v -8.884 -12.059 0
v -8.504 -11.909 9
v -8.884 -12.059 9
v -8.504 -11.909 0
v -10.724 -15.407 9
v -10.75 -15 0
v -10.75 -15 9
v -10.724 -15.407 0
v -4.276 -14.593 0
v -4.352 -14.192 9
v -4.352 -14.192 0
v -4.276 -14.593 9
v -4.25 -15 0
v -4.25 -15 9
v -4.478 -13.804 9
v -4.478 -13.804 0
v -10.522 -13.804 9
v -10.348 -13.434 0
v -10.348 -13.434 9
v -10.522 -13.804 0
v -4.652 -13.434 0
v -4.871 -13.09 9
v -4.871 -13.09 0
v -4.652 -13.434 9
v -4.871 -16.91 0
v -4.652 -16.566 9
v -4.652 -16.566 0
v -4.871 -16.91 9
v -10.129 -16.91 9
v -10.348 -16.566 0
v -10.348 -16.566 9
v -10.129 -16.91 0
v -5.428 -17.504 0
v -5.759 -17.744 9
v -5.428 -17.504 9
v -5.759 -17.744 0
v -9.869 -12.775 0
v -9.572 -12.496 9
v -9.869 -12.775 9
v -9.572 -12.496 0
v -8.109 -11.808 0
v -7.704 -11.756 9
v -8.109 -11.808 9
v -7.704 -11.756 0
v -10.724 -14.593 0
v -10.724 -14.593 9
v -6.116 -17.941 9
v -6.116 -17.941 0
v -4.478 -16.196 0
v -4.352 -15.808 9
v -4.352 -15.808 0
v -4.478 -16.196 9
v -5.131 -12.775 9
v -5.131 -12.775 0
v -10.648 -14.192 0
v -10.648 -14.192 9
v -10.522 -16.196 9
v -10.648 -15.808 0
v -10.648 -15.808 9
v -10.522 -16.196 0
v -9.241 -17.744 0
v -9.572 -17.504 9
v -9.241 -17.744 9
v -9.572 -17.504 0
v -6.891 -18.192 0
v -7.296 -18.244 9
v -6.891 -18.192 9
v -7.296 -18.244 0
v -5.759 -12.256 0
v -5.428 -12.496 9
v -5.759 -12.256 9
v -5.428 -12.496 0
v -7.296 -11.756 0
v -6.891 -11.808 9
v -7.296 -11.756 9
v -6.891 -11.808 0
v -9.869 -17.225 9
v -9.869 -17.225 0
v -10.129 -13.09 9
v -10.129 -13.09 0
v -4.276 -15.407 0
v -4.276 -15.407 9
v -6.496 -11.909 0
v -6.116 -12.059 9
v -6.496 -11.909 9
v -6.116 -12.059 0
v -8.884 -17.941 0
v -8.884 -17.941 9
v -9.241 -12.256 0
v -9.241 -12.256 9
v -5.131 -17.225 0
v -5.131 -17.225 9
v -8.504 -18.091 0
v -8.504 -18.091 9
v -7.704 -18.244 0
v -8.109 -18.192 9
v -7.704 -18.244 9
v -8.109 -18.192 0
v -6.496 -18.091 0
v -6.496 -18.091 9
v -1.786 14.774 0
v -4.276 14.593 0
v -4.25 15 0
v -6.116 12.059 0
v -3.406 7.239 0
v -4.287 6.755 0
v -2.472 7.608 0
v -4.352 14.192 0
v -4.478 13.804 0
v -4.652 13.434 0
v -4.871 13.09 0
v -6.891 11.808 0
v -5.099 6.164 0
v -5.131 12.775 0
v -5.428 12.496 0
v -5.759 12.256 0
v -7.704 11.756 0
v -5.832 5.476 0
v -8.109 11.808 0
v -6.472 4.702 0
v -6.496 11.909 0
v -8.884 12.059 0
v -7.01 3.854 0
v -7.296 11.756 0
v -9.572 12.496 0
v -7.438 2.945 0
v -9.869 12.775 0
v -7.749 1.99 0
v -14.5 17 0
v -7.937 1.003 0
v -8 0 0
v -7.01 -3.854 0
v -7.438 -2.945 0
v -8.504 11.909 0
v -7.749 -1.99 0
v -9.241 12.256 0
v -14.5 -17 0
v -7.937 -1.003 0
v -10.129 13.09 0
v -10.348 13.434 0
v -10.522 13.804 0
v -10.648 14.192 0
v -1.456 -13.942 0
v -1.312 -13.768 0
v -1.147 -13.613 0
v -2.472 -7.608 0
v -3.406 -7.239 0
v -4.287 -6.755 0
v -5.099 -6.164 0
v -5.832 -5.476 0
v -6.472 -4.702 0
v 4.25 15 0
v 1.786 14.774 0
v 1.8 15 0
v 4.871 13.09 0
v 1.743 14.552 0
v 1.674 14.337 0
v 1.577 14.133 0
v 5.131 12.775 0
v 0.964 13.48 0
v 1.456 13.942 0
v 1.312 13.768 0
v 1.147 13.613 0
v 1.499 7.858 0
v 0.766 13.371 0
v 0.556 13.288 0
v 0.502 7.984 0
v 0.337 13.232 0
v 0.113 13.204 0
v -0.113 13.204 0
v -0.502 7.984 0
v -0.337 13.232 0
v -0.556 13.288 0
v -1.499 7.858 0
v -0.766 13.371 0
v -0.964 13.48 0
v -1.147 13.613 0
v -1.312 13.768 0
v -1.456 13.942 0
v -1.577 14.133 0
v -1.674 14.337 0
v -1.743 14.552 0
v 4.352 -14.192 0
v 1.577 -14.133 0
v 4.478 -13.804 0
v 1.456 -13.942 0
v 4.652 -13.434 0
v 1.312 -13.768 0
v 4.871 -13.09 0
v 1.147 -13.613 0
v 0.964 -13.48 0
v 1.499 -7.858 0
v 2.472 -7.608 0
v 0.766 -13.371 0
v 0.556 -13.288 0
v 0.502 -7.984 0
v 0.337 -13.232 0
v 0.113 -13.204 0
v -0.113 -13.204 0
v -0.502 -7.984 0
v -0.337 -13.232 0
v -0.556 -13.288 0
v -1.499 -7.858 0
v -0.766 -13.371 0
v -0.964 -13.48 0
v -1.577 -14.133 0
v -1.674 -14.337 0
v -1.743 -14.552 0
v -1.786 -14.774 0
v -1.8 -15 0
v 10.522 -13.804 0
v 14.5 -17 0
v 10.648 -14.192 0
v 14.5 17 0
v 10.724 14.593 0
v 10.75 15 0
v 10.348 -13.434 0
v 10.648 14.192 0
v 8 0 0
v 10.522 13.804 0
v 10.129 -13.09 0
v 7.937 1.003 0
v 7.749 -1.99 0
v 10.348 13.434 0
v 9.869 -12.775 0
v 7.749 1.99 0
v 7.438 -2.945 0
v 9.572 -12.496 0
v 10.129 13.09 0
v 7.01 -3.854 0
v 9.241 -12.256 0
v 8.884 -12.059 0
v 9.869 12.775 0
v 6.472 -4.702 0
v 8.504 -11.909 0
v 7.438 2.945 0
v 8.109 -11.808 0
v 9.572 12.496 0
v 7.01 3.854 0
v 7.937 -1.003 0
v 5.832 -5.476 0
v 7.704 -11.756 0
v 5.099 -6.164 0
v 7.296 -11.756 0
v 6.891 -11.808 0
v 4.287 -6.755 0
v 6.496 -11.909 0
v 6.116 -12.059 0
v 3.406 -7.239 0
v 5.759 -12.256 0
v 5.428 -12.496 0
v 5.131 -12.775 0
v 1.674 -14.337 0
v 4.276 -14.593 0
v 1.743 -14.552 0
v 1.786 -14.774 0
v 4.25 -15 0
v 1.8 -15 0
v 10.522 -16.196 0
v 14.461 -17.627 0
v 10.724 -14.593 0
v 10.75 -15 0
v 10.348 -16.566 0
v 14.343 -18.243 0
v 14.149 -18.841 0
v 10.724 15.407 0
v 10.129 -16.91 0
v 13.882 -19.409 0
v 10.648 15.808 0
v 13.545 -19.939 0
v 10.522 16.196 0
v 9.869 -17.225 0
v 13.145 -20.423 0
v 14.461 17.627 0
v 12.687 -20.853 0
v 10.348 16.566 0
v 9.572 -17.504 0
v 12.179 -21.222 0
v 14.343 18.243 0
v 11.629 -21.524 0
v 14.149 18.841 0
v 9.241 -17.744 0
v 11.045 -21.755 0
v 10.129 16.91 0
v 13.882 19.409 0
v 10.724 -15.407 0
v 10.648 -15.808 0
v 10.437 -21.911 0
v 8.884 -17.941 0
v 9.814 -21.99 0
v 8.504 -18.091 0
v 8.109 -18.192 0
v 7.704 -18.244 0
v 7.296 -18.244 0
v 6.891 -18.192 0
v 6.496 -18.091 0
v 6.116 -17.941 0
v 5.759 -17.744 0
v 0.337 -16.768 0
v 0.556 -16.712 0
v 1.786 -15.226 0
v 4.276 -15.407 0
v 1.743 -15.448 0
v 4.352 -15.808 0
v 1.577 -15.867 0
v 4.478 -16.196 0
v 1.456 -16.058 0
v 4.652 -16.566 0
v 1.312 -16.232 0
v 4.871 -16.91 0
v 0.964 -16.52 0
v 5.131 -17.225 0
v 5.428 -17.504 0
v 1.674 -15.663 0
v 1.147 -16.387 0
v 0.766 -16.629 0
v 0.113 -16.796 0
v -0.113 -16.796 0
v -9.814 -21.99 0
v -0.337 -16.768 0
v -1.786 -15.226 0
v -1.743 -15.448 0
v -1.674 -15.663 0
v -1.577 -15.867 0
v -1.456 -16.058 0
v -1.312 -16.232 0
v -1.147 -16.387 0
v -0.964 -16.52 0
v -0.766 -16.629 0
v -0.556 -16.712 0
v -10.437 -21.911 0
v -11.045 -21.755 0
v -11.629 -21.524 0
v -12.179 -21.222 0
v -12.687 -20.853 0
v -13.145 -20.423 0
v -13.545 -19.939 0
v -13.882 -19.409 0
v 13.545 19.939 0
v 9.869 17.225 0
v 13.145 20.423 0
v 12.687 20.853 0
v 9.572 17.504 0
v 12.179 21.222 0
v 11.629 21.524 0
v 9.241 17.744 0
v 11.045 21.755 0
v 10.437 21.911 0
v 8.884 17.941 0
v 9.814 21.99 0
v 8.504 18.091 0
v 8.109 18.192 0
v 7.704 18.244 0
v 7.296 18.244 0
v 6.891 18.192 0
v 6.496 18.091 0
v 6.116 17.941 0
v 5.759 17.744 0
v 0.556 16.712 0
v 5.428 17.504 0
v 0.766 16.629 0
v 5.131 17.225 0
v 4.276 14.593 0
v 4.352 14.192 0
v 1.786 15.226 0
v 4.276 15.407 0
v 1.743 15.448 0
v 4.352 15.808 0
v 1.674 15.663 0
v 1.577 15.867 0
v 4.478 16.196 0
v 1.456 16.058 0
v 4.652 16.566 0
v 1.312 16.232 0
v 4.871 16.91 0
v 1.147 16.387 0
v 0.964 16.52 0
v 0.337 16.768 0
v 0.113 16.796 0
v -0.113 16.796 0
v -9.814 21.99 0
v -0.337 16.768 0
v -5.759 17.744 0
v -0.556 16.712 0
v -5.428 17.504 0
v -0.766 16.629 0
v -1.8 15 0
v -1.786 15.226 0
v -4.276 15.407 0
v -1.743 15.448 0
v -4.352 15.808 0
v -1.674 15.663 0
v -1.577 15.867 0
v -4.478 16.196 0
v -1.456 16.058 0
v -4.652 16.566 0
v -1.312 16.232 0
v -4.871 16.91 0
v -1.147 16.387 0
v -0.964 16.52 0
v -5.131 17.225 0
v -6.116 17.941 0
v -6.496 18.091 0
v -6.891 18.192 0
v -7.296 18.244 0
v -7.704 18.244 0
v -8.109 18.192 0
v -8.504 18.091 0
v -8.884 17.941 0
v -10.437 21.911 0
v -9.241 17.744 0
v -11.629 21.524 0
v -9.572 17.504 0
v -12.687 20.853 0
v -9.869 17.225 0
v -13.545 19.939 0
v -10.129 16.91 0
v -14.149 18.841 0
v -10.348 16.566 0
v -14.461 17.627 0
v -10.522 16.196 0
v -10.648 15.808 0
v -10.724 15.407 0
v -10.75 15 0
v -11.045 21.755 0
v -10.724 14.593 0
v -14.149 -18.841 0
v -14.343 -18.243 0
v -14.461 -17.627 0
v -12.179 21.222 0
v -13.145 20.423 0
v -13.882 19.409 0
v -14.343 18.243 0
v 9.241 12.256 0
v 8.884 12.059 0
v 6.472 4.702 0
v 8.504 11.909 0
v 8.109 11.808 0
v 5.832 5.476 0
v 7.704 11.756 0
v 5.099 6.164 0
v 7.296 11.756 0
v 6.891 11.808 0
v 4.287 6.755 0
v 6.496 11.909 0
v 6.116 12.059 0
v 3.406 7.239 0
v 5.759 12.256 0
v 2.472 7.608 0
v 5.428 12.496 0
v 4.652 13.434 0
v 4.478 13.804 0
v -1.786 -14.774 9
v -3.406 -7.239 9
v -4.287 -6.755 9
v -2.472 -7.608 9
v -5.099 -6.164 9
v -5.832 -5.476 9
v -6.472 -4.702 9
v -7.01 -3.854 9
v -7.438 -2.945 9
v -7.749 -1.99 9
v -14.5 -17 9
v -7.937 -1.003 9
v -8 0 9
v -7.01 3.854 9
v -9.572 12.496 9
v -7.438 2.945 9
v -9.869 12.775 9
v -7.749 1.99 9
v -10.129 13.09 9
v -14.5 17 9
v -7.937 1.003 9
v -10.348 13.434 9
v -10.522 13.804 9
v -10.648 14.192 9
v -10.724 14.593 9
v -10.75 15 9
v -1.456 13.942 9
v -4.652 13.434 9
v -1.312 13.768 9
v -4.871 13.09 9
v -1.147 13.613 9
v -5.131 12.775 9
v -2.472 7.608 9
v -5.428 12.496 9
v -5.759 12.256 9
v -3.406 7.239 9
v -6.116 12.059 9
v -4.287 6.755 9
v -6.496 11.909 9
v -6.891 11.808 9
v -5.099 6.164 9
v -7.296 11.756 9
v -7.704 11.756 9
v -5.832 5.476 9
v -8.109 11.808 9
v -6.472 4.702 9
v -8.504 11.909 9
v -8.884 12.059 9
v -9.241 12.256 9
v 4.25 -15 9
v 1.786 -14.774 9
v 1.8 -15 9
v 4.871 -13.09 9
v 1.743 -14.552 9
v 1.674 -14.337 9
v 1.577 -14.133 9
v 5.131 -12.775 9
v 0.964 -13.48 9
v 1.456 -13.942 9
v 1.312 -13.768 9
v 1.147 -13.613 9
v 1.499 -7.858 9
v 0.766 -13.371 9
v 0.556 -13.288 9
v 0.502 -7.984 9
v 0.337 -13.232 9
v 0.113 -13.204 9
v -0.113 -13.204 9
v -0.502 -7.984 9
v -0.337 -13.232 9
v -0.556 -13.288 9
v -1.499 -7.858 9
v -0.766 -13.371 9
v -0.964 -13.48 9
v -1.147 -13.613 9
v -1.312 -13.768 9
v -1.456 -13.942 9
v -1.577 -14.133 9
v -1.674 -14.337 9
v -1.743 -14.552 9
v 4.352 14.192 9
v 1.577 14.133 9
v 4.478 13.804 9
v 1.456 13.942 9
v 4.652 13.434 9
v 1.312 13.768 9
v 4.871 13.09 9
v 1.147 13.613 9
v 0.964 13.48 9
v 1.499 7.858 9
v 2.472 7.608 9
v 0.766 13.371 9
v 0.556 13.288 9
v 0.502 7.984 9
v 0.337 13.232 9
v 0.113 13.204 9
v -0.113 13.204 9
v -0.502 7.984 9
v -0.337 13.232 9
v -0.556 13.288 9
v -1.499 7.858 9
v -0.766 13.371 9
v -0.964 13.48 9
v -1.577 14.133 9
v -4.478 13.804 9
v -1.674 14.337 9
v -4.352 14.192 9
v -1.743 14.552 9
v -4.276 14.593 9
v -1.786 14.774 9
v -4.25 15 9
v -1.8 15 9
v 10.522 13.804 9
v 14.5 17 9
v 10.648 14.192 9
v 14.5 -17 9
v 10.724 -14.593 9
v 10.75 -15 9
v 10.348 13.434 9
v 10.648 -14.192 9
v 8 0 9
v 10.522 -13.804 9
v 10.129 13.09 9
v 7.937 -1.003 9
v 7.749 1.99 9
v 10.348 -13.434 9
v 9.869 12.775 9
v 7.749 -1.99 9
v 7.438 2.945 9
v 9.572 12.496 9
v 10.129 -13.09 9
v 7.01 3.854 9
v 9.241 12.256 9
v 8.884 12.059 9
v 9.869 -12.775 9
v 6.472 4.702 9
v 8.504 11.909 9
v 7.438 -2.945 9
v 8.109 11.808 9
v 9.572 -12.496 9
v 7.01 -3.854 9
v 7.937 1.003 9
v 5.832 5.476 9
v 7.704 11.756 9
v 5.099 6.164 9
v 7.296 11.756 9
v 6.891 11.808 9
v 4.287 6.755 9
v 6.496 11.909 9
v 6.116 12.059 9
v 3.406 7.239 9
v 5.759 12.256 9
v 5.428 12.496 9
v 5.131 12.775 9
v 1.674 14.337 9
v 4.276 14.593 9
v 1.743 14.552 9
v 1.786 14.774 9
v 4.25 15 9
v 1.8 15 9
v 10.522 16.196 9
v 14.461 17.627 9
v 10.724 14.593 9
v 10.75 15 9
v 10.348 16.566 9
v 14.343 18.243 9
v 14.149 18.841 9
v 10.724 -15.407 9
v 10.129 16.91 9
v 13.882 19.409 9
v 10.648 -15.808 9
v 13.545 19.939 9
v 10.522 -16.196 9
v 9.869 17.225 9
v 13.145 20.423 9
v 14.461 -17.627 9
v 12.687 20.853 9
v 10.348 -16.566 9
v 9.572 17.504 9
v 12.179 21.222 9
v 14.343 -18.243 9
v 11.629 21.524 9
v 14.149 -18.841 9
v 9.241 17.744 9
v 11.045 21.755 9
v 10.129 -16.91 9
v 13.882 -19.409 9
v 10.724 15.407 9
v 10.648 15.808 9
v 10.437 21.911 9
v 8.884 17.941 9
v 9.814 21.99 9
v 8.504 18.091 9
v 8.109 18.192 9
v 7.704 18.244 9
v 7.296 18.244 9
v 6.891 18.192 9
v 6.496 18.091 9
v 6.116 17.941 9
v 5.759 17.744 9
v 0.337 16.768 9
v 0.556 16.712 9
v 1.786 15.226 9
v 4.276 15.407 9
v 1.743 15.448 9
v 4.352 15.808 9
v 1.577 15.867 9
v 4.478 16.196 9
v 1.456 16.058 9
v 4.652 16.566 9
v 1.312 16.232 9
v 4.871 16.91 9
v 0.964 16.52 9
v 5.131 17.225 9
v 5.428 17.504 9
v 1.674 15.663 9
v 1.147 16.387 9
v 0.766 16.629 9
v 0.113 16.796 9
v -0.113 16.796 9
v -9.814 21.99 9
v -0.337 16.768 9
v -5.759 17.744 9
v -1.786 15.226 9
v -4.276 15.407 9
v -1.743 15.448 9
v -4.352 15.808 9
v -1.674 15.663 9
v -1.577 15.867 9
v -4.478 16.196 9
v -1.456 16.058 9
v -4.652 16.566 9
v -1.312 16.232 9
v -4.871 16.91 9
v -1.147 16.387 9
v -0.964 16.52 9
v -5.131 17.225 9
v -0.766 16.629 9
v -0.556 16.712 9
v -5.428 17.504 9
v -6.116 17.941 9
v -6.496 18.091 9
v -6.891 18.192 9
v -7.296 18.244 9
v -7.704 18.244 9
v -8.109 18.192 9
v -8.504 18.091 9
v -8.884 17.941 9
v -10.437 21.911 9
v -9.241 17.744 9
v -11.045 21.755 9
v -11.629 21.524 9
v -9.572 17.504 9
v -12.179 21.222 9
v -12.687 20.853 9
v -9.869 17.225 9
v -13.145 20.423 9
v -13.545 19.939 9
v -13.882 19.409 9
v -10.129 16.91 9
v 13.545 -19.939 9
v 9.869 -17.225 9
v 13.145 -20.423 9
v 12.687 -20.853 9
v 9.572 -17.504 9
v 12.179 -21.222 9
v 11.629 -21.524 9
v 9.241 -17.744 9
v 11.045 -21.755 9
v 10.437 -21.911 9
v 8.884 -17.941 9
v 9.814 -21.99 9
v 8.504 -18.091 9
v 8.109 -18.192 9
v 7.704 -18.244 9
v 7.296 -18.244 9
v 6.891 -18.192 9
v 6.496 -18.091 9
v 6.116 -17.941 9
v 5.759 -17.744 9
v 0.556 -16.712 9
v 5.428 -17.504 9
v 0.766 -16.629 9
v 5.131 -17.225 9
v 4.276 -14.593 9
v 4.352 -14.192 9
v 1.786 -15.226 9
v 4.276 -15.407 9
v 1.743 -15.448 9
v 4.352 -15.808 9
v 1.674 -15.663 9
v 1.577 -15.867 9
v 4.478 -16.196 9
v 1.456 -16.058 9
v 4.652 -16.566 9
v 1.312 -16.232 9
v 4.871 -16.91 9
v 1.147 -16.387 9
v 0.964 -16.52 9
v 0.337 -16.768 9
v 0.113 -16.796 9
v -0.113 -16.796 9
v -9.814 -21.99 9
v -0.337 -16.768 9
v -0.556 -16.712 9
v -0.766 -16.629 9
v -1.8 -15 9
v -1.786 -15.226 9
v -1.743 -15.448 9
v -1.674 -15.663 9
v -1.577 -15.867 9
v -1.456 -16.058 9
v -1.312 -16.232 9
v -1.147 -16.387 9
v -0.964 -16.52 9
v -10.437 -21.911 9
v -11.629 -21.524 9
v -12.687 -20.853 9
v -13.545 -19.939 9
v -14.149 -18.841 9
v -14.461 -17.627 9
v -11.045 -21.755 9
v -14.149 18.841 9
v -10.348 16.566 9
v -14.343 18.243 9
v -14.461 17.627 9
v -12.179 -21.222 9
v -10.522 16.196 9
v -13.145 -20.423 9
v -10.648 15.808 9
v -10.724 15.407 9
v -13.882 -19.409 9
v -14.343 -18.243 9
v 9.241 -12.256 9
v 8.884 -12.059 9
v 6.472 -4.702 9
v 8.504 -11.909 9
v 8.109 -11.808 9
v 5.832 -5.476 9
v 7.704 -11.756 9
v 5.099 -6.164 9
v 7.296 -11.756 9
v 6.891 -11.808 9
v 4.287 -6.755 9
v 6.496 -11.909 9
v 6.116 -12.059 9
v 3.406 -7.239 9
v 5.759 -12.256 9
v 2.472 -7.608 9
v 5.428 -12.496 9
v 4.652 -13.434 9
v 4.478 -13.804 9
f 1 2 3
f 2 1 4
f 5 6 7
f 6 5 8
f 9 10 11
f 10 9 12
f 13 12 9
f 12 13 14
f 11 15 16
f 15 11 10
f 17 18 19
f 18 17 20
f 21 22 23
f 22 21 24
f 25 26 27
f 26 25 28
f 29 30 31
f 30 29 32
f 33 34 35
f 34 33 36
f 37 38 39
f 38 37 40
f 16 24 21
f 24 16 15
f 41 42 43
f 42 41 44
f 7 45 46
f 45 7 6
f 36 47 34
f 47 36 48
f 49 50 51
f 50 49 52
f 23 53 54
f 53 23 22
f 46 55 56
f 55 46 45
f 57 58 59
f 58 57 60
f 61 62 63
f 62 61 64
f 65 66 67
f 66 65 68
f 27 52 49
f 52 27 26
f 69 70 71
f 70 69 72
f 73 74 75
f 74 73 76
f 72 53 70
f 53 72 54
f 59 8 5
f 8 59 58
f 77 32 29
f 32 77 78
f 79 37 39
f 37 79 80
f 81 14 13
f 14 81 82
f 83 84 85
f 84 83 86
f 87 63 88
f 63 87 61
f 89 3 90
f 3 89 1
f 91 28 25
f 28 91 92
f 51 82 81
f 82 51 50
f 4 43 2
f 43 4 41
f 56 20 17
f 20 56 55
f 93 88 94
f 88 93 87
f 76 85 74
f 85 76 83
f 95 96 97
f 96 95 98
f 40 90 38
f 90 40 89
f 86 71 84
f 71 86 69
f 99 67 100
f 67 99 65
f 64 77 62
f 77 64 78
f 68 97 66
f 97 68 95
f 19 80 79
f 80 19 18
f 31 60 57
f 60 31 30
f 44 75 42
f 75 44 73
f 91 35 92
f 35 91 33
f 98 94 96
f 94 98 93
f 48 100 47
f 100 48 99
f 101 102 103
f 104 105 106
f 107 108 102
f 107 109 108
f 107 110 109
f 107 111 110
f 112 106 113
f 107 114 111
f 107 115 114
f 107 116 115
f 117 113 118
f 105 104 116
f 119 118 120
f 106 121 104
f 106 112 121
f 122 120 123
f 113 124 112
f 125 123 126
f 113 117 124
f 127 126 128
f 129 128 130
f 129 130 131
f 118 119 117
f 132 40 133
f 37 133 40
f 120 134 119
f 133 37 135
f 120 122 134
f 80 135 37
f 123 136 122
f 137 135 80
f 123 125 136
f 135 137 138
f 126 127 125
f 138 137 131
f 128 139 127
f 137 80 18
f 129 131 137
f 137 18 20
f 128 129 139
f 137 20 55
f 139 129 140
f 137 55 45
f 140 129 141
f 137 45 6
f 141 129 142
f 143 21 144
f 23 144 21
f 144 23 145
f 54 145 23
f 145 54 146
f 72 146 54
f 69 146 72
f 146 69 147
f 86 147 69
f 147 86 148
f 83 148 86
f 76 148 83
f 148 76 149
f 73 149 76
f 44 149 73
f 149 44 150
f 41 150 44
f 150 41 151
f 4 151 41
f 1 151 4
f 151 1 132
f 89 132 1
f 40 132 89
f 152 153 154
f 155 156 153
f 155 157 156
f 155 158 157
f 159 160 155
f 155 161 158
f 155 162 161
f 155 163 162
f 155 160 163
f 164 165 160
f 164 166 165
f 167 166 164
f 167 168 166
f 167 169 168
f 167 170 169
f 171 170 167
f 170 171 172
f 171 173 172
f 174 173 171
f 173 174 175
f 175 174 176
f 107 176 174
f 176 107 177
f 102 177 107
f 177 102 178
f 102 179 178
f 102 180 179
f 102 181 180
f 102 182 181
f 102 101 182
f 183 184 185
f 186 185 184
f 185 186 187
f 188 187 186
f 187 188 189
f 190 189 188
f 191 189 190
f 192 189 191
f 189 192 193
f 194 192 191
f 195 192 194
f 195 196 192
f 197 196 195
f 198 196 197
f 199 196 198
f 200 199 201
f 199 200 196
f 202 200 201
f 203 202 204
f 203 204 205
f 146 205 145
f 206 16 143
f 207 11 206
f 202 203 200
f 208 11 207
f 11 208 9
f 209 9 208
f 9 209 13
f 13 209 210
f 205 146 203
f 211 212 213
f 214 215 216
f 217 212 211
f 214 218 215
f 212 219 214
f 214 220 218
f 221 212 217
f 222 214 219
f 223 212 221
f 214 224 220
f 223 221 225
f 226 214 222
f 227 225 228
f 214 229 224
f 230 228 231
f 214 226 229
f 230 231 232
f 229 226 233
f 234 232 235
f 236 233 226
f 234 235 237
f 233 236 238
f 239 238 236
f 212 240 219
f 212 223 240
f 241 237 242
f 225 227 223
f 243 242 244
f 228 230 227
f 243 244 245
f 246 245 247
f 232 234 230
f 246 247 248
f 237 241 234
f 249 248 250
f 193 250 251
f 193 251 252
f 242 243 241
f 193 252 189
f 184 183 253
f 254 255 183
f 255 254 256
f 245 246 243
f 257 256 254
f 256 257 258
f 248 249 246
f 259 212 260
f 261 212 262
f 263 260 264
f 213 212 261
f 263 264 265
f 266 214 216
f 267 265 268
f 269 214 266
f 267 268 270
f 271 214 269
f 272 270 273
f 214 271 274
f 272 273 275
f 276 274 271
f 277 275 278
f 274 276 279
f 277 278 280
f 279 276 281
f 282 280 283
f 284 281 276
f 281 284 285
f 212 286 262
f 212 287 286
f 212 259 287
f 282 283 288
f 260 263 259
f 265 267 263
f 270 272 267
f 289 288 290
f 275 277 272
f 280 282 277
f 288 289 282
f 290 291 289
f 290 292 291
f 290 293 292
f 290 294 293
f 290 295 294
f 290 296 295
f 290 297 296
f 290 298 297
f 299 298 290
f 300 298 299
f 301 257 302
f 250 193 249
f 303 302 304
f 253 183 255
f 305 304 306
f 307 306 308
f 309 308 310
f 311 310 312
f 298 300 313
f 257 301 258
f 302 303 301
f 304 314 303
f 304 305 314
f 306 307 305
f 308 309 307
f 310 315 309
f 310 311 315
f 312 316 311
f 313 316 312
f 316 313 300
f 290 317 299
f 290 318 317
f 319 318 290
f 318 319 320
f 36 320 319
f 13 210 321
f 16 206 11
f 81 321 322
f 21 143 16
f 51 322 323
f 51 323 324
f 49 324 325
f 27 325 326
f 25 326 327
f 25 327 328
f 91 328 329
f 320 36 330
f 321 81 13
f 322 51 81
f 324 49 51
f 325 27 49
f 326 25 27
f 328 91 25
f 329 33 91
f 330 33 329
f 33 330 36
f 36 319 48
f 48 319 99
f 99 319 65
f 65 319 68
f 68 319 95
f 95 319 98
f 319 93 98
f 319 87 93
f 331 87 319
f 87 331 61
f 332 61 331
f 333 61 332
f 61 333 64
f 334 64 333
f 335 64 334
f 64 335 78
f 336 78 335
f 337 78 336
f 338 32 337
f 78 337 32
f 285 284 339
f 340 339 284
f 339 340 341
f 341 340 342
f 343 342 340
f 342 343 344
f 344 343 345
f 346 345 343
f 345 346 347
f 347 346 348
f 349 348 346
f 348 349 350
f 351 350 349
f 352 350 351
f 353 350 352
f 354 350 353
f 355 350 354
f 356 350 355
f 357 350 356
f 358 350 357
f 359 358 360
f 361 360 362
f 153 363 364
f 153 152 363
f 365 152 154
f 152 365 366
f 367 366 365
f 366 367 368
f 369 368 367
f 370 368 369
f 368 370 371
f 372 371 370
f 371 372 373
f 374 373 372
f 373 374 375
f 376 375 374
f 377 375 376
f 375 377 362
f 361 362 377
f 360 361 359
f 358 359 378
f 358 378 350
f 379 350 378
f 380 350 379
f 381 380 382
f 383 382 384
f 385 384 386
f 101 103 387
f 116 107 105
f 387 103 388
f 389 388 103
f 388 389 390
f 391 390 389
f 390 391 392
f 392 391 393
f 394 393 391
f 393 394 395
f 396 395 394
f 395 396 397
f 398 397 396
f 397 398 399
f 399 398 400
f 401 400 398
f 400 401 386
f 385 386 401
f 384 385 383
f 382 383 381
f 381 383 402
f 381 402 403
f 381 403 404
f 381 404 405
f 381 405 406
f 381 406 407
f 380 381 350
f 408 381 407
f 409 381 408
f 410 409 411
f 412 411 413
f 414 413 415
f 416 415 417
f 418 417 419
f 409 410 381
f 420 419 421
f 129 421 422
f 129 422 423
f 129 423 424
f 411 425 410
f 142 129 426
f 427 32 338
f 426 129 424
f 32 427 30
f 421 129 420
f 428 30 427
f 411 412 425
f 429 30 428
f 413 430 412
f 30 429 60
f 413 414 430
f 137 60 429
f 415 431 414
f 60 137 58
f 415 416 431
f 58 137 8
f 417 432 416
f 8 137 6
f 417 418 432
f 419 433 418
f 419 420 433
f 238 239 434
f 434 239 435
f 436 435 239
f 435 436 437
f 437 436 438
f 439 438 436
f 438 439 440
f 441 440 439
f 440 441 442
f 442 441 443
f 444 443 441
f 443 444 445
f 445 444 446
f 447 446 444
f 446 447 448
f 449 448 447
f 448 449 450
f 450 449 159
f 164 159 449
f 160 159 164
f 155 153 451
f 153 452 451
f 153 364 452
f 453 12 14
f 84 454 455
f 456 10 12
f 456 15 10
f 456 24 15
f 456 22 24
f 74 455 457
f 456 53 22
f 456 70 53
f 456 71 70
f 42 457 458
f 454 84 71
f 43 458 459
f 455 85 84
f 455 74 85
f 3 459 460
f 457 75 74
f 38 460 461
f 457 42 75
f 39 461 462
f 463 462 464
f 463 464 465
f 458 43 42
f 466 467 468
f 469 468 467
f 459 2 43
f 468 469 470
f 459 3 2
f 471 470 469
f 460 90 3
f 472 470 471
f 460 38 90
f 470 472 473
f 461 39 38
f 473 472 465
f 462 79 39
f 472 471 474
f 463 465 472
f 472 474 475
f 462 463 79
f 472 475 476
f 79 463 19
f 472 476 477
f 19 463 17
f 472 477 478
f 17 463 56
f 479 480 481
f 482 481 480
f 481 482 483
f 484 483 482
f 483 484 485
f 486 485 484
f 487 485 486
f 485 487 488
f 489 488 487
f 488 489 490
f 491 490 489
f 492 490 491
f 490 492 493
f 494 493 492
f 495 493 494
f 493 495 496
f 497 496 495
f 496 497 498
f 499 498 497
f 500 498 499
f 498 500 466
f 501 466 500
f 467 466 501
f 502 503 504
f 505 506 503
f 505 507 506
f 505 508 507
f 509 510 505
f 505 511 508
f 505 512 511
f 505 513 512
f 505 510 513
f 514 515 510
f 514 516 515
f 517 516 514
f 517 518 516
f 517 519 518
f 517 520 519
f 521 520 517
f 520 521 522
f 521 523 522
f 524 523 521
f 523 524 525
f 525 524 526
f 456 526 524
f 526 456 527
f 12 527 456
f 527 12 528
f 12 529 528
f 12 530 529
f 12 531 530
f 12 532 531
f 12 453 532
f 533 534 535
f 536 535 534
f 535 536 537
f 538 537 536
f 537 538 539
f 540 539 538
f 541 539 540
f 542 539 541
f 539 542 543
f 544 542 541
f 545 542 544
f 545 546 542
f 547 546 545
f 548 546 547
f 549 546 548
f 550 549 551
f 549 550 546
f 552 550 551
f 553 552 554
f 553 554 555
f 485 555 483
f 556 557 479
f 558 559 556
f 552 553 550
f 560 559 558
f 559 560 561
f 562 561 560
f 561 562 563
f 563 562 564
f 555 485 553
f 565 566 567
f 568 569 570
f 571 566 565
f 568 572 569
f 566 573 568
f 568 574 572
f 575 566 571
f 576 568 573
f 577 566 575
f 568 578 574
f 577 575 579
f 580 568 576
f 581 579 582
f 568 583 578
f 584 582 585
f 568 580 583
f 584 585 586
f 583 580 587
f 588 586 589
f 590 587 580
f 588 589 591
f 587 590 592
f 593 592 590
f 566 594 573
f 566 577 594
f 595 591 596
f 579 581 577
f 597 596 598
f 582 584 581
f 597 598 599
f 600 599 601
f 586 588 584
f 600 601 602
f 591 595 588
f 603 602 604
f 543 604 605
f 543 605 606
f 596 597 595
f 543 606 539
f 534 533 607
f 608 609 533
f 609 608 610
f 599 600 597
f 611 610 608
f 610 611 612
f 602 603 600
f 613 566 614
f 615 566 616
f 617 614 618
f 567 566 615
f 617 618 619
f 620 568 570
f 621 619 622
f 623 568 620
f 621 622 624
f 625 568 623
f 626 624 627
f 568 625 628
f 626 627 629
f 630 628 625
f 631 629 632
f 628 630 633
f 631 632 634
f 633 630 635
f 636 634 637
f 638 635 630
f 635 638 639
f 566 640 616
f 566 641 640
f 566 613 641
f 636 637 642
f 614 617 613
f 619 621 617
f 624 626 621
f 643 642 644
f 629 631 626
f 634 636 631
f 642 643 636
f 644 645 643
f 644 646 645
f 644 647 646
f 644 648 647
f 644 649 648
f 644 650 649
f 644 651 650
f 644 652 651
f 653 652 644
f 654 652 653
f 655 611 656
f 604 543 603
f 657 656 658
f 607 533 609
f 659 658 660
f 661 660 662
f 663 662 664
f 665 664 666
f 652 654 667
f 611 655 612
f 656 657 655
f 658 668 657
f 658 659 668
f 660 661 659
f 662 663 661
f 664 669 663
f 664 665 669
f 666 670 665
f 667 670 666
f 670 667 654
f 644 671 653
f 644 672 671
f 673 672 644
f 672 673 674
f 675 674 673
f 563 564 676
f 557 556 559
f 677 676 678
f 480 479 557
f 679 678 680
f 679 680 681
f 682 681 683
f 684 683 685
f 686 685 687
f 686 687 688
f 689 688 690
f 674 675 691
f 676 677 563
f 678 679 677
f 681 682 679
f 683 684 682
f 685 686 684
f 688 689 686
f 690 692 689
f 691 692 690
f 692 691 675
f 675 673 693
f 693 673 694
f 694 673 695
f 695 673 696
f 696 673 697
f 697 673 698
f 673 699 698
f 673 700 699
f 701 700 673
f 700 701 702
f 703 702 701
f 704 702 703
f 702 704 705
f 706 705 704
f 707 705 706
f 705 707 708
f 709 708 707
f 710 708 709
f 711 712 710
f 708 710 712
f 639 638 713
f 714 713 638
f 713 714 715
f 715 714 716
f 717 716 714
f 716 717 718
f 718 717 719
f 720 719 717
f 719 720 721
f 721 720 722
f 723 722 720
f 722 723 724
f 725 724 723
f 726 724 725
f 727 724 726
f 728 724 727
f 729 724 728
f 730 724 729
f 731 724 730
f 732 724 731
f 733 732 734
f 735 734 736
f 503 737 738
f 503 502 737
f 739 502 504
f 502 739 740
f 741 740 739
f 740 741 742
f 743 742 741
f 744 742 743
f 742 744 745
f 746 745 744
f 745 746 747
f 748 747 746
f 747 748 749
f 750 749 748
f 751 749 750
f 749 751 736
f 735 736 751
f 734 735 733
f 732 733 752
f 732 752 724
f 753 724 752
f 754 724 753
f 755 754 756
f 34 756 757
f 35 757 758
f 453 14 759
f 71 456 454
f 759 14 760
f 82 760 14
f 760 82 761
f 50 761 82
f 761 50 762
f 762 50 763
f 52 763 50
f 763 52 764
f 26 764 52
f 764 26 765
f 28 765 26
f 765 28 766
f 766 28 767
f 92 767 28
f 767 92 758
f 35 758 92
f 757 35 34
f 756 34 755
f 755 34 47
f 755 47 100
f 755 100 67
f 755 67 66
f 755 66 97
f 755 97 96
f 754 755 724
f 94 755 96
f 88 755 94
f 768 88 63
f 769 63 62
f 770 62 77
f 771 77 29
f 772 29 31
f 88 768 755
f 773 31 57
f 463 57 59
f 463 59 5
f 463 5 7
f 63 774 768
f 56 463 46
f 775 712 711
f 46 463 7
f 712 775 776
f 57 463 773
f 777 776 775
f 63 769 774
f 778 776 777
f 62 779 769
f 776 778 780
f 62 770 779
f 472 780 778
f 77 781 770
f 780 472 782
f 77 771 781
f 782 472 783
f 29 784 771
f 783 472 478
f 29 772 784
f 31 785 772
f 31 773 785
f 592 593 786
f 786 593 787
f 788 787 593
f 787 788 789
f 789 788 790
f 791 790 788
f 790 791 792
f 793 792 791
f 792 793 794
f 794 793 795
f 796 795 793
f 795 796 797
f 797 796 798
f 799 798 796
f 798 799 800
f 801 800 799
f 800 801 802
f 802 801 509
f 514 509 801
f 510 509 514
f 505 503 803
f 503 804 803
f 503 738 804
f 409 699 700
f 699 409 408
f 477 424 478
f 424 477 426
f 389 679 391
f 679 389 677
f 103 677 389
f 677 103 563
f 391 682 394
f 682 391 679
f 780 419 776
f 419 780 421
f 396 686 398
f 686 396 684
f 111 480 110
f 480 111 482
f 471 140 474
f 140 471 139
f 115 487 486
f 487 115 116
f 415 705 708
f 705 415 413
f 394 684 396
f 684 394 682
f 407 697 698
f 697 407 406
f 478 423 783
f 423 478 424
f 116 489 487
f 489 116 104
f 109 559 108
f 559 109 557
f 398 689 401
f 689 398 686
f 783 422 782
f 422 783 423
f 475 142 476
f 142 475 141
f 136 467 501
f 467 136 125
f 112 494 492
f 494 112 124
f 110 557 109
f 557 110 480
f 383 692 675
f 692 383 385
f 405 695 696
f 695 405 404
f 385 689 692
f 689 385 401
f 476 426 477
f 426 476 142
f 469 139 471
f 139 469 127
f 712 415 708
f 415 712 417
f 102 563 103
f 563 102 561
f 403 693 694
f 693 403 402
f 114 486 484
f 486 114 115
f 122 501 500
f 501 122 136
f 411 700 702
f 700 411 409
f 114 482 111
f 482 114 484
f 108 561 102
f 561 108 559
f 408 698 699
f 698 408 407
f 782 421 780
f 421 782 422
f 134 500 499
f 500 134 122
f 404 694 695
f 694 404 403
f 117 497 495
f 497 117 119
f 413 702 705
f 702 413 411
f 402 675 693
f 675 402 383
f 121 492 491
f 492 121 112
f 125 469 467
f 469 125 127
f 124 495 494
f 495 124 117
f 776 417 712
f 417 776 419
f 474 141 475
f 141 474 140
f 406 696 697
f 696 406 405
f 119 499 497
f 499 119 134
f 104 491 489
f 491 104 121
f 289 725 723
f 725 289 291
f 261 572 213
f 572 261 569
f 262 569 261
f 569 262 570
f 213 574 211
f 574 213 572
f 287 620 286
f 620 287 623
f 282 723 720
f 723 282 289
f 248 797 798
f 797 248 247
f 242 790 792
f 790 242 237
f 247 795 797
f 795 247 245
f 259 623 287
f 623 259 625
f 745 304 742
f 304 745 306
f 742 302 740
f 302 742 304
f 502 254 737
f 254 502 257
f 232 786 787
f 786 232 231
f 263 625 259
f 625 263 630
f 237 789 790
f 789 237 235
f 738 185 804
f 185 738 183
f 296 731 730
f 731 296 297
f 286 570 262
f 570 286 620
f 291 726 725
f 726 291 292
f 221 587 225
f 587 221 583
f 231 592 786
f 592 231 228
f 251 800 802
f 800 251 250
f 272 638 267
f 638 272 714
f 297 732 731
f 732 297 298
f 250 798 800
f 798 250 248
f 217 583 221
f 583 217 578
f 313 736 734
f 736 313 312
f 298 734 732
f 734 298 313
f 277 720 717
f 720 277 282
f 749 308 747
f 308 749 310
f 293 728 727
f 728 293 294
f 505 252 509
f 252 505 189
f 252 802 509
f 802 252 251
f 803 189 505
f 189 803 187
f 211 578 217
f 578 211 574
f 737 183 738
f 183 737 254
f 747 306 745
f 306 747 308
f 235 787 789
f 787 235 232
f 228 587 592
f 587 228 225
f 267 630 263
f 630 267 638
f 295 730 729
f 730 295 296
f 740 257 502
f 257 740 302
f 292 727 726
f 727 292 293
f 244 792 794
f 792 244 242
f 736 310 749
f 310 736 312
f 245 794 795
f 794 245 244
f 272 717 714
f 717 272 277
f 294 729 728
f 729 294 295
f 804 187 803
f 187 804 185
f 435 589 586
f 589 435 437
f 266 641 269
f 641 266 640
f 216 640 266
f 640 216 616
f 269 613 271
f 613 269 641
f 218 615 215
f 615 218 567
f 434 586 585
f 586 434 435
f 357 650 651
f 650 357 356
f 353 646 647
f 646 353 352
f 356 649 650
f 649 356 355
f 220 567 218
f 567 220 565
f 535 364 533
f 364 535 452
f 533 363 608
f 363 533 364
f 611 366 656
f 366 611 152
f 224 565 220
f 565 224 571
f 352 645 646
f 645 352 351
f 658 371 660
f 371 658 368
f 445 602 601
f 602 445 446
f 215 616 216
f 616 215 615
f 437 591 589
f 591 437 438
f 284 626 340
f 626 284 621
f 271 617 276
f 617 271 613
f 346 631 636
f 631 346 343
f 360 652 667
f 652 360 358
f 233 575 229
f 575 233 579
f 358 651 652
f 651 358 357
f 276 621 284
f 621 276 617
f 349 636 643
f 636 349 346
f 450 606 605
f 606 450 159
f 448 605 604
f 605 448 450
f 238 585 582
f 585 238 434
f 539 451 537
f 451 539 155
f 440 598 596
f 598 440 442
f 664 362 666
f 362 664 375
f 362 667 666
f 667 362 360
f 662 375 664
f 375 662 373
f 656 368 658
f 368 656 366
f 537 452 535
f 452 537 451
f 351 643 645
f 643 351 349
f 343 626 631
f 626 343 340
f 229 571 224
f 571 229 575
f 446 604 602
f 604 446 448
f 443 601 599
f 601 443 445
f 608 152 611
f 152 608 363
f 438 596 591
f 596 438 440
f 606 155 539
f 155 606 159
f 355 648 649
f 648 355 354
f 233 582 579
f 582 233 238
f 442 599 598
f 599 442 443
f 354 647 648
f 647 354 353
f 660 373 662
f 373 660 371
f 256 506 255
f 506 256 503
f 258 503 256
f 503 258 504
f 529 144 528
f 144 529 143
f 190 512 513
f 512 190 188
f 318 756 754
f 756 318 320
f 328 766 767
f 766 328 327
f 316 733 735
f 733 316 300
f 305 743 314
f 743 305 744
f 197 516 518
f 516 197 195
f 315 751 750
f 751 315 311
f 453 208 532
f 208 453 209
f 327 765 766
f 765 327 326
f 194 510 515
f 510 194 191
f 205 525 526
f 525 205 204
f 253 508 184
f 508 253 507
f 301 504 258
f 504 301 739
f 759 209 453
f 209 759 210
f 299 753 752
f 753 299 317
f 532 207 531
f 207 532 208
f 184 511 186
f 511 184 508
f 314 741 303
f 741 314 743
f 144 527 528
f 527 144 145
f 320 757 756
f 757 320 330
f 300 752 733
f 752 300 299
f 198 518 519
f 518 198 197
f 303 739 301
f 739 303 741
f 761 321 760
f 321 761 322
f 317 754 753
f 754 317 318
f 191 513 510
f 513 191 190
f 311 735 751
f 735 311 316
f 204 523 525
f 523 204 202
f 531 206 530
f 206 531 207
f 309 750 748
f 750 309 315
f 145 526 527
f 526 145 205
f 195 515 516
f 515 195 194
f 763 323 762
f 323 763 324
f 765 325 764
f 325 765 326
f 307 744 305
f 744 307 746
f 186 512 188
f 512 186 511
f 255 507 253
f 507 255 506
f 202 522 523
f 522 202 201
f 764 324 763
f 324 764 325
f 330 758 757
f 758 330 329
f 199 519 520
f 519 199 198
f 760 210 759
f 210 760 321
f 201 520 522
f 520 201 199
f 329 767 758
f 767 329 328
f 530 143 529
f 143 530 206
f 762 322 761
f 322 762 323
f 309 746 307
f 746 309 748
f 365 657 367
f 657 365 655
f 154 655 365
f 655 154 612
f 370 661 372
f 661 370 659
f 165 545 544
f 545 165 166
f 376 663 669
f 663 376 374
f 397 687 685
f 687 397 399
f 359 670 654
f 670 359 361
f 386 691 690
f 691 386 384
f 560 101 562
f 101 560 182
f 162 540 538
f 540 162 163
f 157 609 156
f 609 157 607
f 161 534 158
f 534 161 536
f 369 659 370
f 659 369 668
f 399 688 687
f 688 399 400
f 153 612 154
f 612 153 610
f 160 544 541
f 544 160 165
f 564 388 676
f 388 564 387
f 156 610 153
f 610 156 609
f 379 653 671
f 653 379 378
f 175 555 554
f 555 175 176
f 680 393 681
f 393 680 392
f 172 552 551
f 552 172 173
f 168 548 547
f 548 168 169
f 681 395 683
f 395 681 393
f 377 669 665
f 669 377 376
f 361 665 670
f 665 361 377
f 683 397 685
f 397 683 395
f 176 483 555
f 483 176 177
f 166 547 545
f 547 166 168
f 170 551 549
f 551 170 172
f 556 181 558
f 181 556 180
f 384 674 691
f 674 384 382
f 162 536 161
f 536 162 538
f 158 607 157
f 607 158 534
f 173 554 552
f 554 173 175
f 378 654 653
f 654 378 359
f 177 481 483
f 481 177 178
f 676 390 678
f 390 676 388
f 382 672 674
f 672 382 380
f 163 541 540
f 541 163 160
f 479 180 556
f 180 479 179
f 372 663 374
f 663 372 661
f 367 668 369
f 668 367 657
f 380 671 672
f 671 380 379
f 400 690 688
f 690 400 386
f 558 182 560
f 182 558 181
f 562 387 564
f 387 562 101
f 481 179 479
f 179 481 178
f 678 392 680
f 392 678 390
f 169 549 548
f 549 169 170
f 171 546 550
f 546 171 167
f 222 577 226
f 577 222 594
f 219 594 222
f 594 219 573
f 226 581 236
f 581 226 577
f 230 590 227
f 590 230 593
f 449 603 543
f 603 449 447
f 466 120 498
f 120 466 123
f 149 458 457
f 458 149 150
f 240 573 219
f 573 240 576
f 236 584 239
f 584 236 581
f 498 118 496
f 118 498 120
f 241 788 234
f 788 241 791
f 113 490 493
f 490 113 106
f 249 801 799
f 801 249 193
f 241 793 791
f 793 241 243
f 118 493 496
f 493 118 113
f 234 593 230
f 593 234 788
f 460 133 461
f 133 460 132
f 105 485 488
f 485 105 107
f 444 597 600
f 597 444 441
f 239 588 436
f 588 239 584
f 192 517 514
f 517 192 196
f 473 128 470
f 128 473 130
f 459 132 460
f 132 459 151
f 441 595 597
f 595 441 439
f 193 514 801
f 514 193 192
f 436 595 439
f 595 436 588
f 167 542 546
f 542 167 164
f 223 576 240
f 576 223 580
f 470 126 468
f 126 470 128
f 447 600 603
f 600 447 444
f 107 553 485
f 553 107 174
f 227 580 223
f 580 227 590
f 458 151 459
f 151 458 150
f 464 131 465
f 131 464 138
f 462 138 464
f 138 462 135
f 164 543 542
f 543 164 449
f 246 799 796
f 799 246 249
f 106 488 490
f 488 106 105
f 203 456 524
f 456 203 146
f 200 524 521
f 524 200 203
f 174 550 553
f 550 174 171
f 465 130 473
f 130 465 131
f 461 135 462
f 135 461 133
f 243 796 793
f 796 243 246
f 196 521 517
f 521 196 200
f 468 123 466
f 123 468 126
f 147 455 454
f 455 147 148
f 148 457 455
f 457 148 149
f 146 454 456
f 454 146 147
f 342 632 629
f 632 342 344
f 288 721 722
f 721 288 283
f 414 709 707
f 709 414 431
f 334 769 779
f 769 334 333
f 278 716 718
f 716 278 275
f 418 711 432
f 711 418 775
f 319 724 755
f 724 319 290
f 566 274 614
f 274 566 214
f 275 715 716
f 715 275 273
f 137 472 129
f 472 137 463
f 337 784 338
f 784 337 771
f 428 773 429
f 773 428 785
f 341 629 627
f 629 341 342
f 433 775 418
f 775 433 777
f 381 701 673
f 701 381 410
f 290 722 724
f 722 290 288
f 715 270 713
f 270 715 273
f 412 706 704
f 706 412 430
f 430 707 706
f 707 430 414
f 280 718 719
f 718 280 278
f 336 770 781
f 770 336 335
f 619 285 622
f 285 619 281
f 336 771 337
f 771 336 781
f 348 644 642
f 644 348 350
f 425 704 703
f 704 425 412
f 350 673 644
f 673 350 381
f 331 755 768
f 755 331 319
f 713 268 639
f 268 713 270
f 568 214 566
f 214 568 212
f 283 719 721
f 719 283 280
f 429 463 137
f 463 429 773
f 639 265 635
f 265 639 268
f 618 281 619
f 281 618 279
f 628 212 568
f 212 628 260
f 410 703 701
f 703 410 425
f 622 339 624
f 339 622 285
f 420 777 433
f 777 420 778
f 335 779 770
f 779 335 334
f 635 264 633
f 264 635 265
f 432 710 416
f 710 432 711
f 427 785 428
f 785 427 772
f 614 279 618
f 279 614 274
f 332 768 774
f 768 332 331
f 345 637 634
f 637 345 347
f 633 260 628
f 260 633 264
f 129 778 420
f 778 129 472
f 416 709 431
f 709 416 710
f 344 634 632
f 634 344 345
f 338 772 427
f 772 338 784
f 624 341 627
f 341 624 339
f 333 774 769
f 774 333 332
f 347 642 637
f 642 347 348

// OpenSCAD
$fn = 50;

difference() {
	union() {
		hull() {
			translate(v = [-9.5, 17.0, 0]) {
				cylinder(h = 9, r = 5);
			}
			translate(v = [9.5, 17.0, 0]) {
				cylinder(h = 9, r = 5);
			}
			translate(v = [-9.5, -17.0, 0]) {
				cylinder(h = 9, r = 5);
			}
			translate(v = [9.5, -17.0, 0]) {
				cylinder(h = 9, r = 5);
			}
		}
	}
	union() {
		translate(v = [-7.5, -15.0, 0]) {
			cylinder(h = 9, r = 3.25);
		}
		translate(v = [-7.5, 15.0, 0]) {
			cylinder(h = 9, r = 3.25);
		}
		translate(v = [7.5, -15.0, 0]) {
			cylinder(h = 9, r = 3.25);
		}
		translate(v = [7.5, 15.0, 0]) {
			cylinder(h = 9, r = 3.25);
		}
		translate(v = [0.0, -15.0, 0]) {
			cylinder(h = 9, r = 1.8);
		}
		translate(v = [0.0, 15.0, 0]) {
			cylinder(h = 9, r = 1.8);
		}
		cylinder(h = 9, r = 8.0);
	}
}
